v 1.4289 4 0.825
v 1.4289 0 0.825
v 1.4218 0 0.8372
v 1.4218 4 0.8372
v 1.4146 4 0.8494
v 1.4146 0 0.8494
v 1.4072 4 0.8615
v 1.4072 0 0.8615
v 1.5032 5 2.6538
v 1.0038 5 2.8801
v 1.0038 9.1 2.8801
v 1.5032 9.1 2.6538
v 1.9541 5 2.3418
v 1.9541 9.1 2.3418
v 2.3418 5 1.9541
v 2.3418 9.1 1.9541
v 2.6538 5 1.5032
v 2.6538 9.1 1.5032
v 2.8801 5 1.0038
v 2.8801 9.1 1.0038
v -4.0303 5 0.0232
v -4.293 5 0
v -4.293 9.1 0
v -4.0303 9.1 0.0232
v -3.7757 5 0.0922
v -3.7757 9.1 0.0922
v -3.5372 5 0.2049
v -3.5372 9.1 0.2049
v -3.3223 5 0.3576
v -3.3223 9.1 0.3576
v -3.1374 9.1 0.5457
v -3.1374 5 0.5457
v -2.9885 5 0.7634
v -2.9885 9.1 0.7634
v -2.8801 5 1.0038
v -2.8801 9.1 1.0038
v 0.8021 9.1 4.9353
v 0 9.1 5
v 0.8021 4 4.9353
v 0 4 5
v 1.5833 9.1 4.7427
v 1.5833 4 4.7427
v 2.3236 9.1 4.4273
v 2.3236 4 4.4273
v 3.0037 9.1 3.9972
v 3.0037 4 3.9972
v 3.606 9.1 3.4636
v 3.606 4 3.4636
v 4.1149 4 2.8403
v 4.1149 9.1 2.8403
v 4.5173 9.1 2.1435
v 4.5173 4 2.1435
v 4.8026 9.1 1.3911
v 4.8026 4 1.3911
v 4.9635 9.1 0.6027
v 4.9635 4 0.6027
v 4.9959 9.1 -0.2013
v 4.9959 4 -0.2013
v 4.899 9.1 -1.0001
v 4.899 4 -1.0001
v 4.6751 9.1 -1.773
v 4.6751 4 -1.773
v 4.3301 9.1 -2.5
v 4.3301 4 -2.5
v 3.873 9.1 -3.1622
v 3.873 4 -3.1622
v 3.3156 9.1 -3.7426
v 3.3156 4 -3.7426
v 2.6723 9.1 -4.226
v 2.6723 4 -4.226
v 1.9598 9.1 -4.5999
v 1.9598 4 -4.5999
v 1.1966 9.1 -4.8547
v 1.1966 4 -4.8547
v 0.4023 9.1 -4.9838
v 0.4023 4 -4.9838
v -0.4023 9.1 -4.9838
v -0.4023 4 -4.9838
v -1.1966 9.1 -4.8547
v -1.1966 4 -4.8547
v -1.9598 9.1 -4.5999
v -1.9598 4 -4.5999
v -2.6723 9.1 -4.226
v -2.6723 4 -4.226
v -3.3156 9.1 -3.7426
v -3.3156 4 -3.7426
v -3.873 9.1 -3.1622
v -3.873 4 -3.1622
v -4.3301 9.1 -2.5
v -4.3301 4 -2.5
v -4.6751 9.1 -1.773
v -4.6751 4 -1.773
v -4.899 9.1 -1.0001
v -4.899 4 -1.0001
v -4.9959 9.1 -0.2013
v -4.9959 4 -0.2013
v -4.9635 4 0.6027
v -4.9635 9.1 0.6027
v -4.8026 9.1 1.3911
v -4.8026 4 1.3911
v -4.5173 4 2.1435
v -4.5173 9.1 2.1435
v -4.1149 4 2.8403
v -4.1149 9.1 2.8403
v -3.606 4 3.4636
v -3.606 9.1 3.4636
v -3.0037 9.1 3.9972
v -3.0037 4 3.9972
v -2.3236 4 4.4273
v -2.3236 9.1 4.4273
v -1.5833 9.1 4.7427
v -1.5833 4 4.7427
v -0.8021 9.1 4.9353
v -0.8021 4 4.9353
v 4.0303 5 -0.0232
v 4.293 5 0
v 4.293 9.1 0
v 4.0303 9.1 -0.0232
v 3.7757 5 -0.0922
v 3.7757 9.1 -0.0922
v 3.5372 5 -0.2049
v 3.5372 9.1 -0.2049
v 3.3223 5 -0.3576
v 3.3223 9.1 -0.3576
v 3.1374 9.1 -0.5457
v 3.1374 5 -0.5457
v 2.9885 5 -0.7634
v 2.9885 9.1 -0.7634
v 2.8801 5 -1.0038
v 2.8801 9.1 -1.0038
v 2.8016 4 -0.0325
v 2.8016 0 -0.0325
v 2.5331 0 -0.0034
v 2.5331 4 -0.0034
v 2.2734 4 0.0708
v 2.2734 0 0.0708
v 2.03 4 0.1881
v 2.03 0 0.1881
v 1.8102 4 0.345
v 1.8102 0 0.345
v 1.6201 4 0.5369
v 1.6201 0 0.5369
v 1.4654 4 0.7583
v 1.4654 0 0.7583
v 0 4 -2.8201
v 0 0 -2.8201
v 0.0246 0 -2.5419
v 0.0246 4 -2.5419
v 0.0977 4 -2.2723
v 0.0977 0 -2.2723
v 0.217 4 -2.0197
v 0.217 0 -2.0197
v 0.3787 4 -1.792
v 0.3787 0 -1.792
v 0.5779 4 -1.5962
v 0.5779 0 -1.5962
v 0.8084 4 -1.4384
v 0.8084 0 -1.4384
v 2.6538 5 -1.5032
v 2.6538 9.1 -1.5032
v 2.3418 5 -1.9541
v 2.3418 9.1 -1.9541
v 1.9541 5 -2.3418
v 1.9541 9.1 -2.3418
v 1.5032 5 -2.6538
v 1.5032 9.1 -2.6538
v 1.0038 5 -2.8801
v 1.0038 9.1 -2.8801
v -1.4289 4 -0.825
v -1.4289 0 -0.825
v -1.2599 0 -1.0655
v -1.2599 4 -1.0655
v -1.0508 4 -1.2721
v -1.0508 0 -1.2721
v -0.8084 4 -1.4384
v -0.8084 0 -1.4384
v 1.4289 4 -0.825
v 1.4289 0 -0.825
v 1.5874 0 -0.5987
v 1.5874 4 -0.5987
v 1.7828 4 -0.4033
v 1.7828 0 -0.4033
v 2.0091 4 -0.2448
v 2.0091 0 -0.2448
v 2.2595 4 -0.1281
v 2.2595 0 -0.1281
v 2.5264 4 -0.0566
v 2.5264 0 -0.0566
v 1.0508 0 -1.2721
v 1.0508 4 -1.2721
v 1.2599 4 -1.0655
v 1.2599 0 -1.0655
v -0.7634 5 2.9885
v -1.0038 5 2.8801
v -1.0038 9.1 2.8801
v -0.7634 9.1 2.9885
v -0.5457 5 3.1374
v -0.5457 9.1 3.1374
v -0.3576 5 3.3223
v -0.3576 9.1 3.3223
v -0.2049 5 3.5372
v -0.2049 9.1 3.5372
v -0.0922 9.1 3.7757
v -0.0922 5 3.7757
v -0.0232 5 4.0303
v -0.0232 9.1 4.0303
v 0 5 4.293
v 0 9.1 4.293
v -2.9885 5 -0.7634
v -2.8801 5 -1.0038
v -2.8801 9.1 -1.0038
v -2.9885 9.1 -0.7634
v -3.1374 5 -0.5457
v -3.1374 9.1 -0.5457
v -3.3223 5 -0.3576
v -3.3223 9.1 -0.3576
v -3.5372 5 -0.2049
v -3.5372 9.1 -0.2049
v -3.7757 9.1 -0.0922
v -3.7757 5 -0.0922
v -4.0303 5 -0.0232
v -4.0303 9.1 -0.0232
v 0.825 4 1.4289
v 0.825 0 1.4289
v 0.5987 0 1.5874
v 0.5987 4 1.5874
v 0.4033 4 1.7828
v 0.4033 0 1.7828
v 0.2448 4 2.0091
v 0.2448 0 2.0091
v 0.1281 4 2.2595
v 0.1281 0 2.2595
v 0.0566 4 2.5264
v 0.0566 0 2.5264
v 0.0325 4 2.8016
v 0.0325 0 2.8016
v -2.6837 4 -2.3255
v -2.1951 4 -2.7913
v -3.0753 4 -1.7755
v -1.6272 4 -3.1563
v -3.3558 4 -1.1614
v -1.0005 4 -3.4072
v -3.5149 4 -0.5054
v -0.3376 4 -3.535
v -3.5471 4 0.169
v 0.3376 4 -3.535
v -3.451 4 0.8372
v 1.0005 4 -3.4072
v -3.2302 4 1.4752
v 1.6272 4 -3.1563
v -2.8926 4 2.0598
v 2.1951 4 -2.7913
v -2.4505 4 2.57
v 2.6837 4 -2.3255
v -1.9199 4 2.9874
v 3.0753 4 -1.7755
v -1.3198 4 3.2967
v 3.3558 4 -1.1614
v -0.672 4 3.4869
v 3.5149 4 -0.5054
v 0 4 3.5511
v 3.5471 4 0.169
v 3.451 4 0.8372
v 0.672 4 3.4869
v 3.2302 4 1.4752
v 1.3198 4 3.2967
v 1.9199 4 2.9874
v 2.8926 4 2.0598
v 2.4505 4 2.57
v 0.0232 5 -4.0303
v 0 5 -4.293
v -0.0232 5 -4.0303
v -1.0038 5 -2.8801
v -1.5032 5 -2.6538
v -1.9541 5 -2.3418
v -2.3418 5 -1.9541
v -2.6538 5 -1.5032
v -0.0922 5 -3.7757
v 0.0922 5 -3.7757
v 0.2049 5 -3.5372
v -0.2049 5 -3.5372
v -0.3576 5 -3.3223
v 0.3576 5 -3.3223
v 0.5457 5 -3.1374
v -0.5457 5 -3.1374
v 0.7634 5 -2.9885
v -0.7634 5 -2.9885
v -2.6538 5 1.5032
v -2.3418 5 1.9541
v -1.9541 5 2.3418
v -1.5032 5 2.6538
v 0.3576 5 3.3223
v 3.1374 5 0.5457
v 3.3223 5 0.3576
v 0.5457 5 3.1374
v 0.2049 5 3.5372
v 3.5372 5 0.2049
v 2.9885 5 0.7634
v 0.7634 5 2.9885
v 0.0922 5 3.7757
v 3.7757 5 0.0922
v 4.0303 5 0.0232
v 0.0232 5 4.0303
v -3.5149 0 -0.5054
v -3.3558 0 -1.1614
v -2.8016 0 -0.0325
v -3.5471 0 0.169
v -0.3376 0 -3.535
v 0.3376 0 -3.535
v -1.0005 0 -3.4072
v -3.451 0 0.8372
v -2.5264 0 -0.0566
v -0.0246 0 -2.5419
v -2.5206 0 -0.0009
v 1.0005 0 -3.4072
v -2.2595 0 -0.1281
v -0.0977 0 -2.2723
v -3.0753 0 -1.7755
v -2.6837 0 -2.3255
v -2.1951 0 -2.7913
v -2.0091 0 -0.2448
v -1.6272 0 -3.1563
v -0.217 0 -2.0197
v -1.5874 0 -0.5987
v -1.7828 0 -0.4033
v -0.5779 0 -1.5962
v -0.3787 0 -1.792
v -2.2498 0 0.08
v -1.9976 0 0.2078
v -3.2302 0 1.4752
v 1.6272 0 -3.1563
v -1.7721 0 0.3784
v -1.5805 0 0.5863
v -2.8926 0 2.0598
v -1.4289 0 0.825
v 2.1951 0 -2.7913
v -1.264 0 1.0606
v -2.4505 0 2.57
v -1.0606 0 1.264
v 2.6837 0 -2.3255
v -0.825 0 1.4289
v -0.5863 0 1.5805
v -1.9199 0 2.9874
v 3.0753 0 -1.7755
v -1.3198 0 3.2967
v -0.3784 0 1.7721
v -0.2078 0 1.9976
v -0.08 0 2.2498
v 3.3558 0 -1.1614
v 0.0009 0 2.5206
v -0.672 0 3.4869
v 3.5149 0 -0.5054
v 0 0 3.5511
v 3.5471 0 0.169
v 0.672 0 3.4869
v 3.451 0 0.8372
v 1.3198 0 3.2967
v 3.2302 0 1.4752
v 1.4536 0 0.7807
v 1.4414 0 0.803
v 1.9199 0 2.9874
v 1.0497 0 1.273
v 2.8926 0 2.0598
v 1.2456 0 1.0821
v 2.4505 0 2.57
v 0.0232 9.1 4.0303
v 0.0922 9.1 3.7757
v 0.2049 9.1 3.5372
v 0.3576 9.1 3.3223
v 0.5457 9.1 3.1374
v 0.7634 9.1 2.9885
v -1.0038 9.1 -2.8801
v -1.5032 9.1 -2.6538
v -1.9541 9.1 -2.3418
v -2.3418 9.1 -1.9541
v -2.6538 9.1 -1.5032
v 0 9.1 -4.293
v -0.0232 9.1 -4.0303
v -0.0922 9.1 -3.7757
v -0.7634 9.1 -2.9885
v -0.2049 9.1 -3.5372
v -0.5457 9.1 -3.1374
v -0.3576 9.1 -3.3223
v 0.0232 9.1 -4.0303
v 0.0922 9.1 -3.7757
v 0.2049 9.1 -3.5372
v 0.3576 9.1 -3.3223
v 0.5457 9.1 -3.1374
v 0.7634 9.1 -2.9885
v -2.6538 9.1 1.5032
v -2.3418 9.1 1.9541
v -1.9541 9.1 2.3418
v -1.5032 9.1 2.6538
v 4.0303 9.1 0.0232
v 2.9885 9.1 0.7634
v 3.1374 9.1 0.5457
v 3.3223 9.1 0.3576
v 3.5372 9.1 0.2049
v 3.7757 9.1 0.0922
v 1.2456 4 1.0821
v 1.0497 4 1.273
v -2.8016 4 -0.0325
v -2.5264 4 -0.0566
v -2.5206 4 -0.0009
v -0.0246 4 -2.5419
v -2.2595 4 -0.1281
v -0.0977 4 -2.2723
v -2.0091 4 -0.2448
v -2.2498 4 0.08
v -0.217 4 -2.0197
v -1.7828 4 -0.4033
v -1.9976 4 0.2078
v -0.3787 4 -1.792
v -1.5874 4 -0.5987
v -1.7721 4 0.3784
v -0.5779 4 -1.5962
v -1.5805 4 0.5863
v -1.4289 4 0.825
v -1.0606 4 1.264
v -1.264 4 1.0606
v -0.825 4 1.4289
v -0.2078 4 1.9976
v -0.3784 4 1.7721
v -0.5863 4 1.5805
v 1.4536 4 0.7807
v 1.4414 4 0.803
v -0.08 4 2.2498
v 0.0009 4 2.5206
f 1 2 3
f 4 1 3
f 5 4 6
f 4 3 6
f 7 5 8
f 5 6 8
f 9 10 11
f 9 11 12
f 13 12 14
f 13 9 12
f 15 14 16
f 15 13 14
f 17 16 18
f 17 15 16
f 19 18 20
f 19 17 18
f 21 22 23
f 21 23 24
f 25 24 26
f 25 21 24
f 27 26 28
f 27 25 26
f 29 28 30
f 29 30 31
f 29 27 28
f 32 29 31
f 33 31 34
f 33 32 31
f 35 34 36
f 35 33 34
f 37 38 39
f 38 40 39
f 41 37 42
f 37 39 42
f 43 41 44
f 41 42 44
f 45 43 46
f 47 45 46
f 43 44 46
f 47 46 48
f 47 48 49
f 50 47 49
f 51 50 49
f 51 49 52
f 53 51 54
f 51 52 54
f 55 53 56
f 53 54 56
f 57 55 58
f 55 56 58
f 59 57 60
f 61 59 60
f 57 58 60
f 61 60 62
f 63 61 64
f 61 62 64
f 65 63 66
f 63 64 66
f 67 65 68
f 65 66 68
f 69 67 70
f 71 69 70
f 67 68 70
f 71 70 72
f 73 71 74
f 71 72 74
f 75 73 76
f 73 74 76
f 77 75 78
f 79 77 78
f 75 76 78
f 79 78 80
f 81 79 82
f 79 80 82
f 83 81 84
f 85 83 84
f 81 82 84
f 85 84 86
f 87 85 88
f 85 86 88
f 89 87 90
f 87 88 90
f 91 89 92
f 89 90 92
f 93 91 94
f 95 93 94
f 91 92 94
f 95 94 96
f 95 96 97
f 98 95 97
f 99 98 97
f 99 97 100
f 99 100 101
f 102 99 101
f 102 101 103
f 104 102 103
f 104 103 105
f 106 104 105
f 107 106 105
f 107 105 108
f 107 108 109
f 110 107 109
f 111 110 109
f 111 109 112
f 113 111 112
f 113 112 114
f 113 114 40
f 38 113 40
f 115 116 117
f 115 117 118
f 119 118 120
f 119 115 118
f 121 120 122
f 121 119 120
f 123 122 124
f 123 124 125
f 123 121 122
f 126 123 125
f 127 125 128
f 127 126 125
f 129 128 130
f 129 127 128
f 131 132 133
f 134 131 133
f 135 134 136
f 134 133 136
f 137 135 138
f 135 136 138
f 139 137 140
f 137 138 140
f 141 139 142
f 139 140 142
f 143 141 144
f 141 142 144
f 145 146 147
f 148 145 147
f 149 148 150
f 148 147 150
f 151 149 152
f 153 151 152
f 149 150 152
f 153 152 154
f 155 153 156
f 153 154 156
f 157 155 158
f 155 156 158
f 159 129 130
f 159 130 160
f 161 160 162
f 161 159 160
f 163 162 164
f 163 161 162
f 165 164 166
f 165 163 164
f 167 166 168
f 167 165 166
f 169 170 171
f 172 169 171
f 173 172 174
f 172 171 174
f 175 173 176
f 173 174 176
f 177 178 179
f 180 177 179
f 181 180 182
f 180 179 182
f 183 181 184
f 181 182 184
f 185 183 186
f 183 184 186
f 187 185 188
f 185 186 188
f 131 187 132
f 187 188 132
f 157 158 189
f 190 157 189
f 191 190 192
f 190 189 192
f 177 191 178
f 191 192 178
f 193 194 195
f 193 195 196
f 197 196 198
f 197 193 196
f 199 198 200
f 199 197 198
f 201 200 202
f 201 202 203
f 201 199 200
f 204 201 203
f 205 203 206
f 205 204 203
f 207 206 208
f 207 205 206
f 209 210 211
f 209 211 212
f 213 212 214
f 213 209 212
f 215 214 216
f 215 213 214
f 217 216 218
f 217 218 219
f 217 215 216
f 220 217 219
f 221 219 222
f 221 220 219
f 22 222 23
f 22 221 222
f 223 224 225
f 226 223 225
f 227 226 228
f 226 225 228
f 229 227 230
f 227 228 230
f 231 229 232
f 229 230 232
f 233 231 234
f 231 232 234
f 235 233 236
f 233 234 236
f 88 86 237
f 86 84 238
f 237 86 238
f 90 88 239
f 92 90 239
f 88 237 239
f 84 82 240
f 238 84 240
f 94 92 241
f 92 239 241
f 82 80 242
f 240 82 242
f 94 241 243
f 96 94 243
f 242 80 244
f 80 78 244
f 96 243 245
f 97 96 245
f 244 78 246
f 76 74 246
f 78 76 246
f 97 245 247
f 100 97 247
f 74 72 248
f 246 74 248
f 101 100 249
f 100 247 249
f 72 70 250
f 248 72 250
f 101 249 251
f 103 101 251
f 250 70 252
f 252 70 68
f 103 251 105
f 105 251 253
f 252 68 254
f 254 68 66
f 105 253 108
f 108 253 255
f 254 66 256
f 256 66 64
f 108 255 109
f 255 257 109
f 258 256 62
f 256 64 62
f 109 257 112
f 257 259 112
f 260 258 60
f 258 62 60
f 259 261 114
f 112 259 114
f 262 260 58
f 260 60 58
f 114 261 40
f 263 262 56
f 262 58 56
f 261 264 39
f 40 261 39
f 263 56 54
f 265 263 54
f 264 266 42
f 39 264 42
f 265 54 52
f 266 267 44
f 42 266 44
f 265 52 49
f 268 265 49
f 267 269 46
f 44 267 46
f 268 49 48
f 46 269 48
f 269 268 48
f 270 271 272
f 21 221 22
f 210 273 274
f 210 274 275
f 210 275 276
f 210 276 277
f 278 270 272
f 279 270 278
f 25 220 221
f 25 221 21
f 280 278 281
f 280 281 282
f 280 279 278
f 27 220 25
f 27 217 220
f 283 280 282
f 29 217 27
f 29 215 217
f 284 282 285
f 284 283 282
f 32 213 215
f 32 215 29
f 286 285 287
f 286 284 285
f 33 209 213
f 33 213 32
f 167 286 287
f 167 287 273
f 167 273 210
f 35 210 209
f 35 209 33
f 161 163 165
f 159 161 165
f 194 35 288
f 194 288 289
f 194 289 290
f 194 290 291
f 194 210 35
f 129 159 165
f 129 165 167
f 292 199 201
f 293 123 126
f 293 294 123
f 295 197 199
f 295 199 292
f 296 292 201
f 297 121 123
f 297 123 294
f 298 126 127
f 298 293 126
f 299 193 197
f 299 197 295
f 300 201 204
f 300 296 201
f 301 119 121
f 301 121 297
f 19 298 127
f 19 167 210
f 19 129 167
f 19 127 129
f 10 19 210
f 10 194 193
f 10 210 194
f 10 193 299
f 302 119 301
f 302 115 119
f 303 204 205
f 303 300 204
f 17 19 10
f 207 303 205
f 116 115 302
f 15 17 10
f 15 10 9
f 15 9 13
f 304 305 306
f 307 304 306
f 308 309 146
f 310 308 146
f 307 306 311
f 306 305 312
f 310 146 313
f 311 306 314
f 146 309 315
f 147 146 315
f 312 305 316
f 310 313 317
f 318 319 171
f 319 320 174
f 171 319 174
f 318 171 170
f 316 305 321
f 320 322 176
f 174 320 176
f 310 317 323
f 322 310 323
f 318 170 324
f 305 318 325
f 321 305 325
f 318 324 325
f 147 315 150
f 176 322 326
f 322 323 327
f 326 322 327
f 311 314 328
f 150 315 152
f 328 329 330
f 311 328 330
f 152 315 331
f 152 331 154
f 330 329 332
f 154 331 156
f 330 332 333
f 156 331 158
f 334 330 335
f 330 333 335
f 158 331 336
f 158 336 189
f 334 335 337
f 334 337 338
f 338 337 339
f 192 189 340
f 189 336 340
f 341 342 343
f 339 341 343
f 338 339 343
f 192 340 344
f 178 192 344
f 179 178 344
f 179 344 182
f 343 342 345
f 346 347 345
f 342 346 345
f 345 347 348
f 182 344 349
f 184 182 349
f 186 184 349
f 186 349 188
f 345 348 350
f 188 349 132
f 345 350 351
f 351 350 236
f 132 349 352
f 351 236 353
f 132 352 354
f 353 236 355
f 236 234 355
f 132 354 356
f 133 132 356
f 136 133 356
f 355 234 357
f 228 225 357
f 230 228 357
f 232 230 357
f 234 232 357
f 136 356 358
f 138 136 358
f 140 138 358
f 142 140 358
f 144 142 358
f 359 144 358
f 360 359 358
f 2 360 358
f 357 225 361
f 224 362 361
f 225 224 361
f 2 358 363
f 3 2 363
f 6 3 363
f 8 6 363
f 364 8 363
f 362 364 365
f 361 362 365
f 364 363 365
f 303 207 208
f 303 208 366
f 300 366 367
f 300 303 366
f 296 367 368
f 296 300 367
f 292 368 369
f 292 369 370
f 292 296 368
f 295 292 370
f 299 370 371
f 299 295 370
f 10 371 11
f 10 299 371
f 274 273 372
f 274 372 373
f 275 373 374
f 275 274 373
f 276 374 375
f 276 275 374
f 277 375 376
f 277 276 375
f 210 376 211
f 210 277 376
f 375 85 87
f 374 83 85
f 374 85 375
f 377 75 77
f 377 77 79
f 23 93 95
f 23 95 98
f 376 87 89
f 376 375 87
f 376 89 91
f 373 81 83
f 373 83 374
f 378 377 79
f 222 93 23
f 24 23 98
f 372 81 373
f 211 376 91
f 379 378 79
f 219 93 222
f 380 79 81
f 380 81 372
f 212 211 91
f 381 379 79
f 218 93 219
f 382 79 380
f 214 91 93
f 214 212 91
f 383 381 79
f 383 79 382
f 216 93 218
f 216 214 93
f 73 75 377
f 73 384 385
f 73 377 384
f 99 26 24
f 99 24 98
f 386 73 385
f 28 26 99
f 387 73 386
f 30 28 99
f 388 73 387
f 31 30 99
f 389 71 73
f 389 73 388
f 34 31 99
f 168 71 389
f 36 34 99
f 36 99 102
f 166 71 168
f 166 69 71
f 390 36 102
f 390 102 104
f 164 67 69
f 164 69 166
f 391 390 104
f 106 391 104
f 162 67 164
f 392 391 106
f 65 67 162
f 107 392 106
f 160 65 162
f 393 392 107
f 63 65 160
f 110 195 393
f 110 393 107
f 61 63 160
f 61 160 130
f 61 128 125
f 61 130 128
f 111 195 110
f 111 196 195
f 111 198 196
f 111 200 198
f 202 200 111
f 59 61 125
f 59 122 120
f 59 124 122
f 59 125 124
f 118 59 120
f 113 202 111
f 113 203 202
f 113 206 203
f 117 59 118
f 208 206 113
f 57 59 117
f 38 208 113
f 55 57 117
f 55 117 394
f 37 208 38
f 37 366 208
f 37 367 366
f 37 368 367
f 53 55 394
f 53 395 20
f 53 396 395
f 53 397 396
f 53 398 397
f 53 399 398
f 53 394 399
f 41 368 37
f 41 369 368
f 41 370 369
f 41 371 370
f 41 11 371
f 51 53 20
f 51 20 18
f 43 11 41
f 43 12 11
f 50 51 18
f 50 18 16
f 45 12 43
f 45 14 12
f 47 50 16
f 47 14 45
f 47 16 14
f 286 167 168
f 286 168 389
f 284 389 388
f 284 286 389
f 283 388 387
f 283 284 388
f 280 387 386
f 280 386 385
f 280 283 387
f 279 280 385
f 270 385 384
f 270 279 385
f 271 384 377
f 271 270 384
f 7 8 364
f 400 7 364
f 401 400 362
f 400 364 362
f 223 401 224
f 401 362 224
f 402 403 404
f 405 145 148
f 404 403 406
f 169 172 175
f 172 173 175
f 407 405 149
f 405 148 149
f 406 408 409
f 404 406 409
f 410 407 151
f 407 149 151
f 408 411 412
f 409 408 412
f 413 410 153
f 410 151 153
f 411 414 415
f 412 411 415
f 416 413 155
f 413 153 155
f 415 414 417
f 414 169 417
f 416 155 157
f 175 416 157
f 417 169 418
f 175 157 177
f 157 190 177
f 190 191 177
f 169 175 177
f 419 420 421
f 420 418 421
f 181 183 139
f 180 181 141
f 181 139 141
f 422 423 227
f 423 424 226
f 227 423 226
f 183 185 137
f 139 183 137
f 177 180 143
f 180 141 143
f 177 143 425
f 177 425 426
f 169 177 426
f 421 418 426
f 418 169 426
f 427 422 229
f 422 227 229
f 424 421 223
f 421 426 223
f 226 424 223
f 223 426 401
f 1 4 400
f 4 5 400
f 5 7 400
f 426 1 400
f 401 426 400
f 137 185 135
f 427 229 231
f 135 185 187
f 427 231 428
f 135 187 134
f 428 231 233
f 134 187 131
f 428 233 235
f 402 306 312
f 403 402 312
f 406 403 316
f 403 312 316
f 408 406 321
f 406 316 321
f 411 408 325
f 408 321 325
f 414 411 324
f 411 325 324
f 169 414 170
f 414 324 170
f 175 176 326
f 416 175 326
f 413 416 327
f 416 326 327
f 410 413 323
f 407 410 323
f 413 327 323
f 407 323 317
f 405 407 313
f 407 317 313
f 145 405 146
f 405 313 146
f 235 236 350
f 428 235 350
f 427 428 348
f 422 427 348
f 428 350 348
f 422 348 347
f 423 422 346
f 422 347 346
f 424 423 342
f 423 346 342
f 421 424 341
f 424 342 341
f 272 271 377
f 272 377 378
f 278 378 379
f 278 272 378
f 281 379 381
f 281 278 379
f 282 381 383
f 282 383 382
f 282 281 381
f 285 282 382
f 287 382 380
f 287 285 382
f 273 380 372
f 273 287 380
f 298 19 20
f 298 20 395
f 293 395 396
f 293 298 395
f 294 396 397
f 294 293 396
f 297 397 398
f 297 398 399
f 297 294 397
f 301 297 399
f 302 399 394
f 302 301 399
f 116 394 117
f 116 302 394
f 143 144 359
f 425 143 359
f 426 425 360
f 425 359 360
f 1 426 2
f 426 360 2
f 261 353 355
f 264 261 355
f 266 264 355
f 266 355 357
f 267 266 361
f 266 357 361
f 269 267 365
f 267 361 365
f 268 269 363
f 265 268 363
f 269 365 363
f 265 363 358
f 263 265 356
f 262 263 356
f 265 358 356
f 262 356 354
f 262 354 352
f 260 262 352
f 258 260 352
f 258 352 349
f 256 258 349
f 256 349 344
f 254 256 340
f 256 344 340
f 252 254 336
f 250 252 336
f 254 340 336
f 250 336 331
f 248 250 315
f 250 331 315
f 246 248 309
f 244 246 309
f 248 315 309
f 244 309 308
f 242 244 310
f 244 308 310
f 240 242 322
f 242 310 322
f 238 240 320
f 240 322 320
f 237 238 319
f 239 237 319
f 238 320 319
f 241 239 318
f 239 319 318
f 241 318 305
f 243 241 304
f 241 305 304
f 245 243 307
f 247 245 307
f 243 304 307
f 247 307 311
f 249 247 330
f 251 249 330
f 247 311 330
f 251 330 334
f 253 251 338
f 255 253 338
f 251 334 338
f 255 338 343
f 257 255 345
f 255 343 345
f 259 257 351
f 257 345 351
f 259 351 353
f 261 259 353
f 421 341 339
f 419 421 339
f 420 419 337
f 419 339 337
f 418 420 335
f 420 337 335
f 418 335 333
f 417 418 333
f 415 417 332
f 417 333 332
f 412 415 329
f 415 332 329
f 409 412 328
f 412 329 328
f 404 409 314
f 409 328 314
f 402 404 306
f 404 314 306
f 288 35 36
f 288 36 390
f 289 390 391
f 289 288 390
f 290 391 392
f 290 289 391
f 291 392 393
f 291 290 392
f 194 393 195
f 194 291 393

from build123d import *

# Parameters (mm, degrees)
SKETCH1_R           = 3.551074582
BOSS_EXTRUDE1_DEPTH = 4
SKETCH2_R           = 5
BOSS_EXTRUDE2_DEPTH = 1
SKETCH3_R           = 5
BOSS_EXTRUDE3_DEPTH = 4.1


with BuildPart() as part:
    # Sketch1 → Boss-Extrude1 (new body)
    with BuildSketch(Plane(origin=(0, 0, 0), x_dir=(1, 0, 0), z_dir=(0, 1, 0))):
        with Locations(Location((0, 0, 0), (0, 0, 270))):
            Circle(SKETCH1_R)
        with BuildLine():
            ThreePointArc((-0.825, -1.428941916), (-1.166726189, -1.166726189), (-1.428941916, -0.825))
            ThreePointArc((-1.428941916, -0.825), (-1.997567148, -0.207840905), (-2.801592181, 0.0325))
            ThreePointArc((-2.801592181, 0.0325), (-2.009092181, 0.244849735), (-1.428941916, 0.825))
            ThreePointArc((-1.428941916, 0.825), (-1.159961762, 1.173451623), (-0.808423493, 1.438385017))
            ThreePointArc((-0.808423493, 1.438385017), (-0.216954174, 2.019684231), (0, 2.820106381))
            ThreePointArc((0, 2.820106381), (0.216954174, 2.019684231), (0.808423493, 1.438385017))
            ThreePointArc((0.808423493, 1.438385017), (1.159961762, 1.173451623), (1.428941916, 0.825))
            ThreePointArc((1.428941916, 0.825), (2.009092181, 0.244849735), (2.801592181, 0.0325))
            ThreePointArc((2.801592181, 0.0325), (2.03004847, -0.188087258), (1.465428549, -0.758300183))
            ThreePointArc((1.465428549, -0.758300183), (1.44756945, -0.791860269), (1.428941916, -0.825))
            ThreePointArc((1.428941916, -0.825), (1.418202031, -0.843328524), (1.407227066, -0.861517258))
            ThreePointArc((1.407227066, -0.861517258), (1.151608486, -1.181650497), (0.825, -1.428941916))
            ThreePointArc((0.825, -1.428941916), (0.244849735, -2.009092181), (0.0325, -2.801592181))
            ThreePointArc((0.0325, -2.801592181), (-0.207840905, -1.997567148), (-0.825, -1.428941916))
        make_face(mode=Mode.SUBTRACT)
    extrude(amount=BOSS_EXTRUDE1_DEPTH)

    # Sketch2 → Boss-Extrude2 (add)
    with BuildSketch(Plane(origin=(0, 4, 0), x_dir=(1, 0, 0), z_dir=(0, 1, 0))):
        with Locations(Location((0, 0, 0), (0, 0, 270))):
            Circle(SKETCH2_R)
    extrude(amount=BOSS_EXTRUDE2_DEPTH)

    # Sketch3 → Boss-Extrude3 (add)
    with BuildSketch(Plane(origin=(0, 5, 0), x_dir=(1, 0, 0), z_dir=(0, 1, 0))):
        with Locations(Location((0, 0, 0), (0, 0, 270))):
            Circle(SKETCH3_R)
        with BuildLine():
            ThreePointArc((-1.003793736, 2.880086481), (-2.156675683, 2.156675683), (-2.880086481, 1.003793736))
            ThreePointArc((-2.880086481, 1.003793736), (-3.426379172, 0.276496236), (-4.292951263, 0))
            ThreePointArc((-4.292951263, 0), (-3.426379172, -0.276496236), (-2.880086481, -1.003793736))
            ThreePointArc((-2.880086481, -1.003793736), (-2.156675683, -2.156675683), (-1.003793736, -2.880086481))
            ThreePointArc((-1.003793736, -2.880086481), (-0.276496236, -3.426379172), (0, -4.292951263))
            ThreePointArc((0, -4.292951263), (0.276496236, -3.426379172), (1.003793736, -2.880086481))
            ThreePointArc((1.003793736, -2.880086481), (2.156675683, -2.156675683), (2.880086481, -1.003793736))
            ThreePointArc((2.880086481, -1.003793736), (3.426379172, -0.276496236), (4.292951263, 0))
            ThreePointArc((4.292951263, 0), (3.426379172, 0.276496236), (2.880086481, 1.003793736))
            ThreePointArc((2.880086481, 1.003793736), (2.156675683, 2.156675683), (1.003793736, 2.880086481))
            ThreePointArc((1.003793736, 2.880086481), (0.276496236, 3.426379172), (0, 4.292951263))
            ThreePointArc((0, 4.292951263), (-0.276496236, 3.426379172), (-1.003793736, 2.880086481))
        make_face(mode=Mode.SUBTRACT)
    extrude(amount=BOSS_EXTRUDE3_DEPTH)


solid = part.part
